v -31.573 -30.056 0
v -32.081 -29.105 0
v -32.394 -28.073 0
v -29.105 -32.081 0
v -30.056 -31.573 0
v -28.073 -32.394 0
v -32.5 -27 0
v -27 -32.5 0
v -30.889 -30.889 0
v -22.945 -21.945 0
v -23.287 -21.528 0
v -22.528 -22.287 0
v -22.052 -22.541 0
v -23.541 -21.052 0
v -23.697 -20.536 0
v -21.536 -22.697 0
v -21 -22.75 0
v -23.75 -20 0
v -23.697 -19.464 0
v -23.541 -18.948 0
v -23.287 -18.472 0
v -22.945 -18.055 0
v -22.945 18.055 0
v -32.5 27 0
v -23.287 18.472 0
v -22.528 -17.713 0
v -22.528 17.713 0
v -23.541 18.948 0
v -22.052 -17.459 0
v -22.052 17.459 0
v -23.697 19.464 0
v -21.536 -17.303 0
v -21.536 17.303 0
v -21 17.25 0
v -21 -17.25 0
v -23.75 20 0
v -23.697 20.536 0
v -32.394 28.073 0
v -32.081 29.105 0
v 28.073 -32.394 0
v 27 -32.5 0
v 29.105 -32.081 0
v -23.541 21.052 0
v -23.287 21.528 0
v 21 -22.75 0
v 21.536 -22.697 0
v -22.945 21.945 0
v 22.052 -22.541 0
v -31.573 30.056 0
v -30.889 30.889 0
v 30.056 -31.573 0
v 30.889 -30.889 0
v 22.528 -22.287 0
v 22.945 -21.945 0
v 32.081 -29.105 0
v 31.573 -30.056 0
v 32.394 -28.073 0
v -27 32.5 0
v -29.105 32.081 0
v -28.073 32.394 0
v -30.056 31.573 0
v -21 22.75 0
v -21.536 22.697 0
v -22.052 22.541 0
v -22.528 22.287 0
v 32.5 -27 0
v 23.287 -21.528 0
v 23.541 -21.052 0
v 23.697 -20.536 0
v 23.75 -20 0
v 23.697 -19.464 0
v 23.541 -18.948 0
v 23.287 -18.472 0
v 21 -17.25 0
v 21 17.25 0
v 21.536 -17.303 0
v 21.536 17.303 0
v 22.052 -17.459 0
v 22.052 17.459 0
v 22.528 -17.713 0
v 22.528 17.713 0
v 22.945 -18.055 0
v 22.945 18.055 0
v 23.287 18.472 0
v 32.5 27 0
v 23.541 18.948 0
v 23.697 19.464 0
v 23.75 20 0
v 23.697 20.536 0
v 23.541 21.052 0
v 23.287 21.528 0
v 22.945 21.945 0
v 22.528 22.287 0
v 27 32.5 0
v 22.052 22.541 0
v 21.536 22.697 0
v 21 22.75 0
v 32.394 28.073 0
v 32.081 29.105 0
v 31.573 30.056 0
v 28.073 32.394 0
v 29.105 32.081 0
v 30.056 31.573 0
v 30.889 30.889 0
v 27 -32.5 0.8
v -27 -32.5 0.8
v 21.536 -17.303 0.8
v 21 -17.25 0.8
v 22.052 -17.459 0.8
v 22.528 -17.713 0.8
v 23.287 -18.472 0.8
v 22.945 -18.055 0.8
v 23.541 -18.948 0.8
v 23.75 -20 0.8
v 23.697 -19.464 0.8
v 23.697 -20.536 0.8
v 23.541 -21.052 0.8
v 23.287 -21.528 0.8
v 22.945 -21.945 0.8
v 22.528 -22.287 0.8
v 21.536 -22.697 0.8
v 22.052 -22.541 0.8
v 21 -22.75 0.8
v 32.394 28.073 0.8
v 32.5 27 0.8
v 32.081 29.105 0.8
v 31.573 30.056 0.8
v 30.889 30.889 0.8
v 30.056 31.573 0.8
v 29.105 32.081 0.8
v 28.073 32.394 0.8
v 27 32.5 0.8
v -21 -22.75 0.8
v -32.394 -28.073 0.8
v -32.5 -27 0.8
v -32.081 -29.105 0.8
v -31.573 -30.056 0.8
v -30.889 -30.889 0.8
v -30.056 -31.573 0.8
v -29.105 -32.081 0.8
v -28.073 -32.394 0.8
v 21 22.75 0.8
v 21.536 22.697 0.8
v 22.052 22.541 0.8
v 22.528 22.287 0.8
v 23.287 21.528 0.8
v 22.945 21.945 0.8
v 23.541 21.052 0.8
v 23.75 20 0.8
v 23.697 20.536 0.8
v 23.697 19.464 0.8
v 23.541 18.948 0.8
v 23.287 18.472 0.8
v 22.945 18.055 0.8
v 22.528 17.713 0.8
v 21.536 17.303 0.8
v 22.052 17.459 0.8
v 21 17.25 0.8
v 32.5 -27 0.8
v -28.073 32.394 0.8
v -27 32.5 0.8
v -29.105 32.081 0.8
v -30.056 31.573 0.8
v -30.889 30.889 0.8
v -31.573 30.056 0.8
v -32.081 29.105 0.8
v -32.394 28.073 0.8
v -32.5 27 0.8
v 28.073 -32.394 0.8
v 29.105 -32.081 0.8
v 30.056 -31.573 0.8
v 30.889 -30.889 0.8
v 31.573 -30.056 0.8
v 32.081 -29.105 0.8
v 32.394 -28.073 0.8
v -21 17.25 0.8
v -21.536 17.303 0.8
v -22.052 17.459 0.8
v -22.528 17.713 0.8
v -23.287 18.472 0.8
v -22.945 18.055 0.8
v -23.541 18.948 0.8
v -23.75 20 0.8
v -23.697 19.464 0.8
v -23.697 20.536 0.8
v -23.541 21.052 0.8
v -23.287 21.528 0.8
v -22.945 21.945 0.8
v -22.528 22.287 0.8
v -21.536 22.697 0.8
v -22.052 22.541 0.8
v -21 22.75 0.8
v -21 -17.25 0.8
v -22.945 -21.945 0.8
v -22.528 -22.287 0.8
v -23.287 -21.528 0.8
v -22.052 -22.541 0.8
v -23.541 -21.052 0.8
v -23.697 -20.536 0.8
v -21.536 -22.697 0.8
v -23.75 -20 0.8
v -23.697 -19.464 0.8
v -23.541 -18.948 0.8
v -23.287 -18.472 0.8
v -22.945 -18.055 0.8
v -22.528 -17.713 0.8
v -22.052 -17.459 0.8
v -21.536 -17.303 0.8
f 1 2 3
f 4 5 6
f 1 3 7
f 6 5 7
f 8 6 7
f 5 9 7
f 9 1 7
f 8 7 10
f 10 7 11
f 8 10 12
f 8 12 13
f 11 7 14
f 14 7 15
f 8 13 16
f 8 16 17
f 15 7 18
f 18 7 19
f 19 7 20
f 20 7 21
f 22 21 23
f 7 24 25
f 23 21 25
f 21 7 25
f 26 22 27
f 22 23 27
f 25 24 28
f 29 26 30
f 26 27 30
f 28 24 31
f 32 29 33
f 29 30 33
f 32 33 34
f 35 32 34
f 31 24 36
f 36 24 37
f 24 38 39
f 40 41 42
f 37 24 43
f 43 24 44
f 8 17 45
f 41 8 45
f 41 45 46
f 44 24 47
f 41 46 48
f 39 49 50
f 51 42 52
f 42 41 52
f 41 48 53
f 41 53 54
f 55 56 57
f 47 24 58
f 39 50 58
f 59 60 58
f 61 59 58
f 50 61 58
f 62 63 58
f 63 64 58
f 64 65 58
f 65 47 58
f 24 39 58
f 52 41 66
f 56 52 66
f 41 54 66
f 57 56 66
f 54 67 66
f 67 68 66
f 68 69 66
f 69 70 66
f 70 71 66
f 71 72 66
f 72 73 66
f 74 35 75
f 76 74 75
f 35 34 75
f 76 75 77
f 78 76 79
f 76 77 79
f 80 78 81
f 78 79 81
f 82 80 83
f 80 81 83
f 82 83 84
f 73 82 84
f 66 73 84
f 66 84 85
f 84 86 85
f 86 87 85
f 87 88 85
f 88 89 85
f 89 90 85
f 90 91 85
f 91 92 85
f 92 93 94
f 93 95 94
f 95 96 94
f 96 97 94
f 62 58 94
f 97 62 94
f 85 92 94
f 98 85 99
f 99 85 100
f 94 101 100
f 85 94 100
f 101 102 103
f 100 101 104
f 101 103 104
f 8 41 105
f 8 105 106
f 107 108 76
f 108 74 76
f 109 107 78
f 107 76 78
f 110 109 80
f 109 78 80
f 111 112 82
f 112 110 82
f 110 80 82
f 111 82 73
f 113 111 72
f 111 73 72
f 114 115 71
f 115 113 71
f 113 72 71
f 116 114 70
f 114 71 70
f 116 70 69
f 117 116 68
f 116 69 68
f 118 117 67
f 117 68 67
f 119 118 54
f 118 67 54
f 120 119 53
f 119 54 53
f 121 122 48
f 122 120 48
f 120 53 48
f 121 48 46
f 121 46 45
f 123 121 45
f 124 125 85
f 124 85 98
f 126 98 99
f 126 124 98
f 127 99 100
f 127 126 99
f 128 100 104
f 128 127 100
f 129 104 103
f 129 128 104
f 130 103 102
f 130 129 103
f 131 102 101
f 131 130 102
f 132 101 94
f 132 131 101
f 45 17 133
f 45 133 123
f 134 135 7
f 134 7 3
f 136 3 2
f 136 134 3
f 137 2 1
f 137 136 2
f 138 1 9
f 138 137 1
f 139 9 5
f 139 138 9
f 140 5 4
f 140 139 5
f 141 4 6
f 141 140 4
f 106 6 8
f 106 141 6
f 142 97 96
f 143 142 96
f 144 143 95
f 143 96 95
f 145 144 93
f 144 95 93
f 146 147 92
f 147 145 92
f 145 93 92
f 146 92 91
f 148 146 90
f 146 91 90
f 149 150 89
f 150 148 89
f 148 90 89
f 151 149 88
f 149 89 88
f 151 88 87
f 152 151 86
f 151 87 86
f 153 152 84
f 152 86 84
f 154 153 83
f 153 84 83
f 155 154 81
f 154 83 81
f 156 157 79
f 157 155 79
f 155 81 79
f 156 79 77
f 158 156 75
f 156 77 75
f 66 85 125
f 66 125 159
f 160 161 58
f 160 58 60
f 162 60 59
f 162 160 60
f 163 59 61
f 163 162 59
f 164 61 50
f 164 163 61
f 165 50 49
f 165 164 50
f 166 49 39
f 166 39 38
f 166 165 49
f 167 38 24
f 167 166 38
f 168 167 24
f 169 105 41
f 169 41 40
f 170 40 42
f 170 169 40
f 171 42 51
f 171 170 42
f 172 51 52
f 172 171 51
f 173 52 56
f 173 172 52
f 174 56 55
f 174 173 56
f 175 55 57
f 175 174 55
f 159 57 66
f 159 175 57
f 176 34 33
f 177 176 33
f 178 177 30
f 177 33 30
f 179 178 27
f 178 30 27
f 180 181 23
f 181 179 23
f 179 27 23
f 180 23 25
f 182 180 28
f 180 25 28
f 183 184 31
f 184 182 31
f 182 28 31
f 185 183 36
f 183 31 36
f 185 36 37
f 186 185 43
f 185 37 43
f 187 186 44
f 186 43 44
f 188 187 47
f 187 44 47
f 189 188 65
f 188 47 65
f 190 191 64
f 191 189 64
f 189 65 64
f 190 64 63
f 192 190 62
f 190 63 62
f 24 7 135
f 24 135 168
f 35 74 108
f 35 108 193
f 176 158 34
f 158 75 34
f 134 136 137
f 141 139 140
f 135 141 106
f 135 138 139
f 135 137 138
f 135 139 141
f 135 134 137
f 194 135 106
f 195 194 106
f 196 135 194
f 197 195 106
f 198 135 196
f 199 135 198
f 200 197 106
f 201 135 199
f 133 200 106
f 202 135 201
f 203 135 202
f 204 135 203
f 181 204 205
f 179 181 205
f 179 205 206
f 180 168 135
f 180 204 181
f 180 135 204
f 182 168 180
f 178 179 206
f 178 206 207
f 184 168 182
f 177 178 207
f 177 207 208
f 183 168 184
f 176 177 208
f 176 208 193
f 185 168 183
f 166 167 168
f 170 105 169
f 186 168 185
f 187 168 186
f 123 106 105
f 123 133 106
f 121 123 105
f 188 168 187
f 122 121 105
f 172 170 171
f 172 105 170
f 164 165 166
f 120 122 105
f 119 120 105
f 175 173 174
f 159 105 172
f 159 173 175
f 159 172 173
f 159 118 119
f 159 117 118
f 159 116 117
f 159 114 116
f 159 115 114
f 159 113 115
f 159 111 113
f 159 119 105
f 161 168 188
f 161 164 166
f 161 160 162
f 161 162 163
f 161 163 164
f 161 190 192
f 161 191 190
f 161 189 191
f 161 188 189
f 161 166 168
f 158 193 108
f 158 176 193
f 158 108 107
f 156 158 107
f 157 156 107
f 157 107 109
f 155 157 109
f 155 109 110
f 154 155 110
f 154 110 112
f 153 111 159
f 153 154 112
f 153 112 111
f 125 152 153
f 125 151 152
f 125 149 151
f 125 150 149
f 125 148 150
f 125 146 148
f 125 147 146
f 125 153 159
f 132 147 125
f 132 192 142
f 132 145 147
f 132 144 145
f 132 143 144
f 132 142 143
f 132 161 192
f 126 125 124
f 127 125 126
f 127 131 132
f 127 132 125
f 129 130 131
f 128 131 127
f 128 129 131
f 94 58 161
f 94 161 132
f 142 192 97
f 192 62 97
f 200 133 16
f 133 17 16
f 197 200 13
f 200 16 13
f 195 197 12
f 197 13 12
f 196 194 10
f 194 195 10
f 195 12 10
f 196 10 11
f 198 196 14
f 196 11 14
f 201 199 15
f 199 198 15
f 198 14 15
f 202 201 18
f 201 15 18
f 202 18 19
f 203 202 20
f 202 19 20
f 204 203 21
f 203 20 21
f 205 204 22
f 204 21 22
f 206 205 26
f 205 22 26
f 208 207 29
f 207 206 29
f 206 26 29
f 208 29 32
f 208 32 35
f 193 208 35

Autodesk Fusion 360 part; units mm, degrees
sketch "Sketch1" plane through (0, 0, 0) normal (0, 0, 1) x (1, 0, 0)
  line L0 (-32.5, 32.5) -> (32.5, 32.5)
  line L1 (32.5, 32.5) -> (32.5, -32.5)
  line L2 (32.5, -32.5) -> (-32.5, -32.5)
  line L3 (-32.5, -32.5) -> (-32.5, 32.5)
  line L4 (-32.5, 32.5) -> (32.5, -32.5) construction
  line L5 (32.5, 32.5) -> (-32.5, -32.5) construction
  line L6 (-32.5, 0) -> (-32.5, 20) construction
  line L7 (-32.5, 20) -> (32.5, 20) construction
  line L8 (-32.5, 0) -> (-32.5, -20) construction
  line L9 (-32.5, -20) -> (32.5, -20) construction
  line L10 (-21, -22.75) -> (21, -22.75)
  arc A0 (21, -22.75) -> (21, -17.25) centre (21, -20) ccw
  line L11 (21, -17.25) -> (-21, -17.25)
  arc A1 (-21, -17.25) -> (-21, -22.75) centre (-21, -20) ccw
  line L12 (-21, -20) -> (21, -20) construction
  line L13 (-32.5, 0) -> (32.5, 0) construction
  line L14 (21, 17.25) -> (-21, 17.25)
  arc A2 (-21, 22.75) -> (-21, 17.25) centre (-21, 20) ccw
  line L15 (-21, 22.75) -> (21, 22.75)
  arc A3 (21, 17.25) -> (21, 22.75) centre (21, 20) ccw
  point P0 (0, -20)
  dimension "d1" = 65
  dimension "d2" = 65
  dimension "d3" = 5.5
extrude "Extrude1" add sketch "Sketch1" along normal blind 0.8
fillet "Fillet1" radius 5.5 4 edges at (32.5, -32.5, 0.4) (32.5, 32.5, 0.4) (-32.5, 32.5, 0.4) (-32.5, -32.5, 0.4)
